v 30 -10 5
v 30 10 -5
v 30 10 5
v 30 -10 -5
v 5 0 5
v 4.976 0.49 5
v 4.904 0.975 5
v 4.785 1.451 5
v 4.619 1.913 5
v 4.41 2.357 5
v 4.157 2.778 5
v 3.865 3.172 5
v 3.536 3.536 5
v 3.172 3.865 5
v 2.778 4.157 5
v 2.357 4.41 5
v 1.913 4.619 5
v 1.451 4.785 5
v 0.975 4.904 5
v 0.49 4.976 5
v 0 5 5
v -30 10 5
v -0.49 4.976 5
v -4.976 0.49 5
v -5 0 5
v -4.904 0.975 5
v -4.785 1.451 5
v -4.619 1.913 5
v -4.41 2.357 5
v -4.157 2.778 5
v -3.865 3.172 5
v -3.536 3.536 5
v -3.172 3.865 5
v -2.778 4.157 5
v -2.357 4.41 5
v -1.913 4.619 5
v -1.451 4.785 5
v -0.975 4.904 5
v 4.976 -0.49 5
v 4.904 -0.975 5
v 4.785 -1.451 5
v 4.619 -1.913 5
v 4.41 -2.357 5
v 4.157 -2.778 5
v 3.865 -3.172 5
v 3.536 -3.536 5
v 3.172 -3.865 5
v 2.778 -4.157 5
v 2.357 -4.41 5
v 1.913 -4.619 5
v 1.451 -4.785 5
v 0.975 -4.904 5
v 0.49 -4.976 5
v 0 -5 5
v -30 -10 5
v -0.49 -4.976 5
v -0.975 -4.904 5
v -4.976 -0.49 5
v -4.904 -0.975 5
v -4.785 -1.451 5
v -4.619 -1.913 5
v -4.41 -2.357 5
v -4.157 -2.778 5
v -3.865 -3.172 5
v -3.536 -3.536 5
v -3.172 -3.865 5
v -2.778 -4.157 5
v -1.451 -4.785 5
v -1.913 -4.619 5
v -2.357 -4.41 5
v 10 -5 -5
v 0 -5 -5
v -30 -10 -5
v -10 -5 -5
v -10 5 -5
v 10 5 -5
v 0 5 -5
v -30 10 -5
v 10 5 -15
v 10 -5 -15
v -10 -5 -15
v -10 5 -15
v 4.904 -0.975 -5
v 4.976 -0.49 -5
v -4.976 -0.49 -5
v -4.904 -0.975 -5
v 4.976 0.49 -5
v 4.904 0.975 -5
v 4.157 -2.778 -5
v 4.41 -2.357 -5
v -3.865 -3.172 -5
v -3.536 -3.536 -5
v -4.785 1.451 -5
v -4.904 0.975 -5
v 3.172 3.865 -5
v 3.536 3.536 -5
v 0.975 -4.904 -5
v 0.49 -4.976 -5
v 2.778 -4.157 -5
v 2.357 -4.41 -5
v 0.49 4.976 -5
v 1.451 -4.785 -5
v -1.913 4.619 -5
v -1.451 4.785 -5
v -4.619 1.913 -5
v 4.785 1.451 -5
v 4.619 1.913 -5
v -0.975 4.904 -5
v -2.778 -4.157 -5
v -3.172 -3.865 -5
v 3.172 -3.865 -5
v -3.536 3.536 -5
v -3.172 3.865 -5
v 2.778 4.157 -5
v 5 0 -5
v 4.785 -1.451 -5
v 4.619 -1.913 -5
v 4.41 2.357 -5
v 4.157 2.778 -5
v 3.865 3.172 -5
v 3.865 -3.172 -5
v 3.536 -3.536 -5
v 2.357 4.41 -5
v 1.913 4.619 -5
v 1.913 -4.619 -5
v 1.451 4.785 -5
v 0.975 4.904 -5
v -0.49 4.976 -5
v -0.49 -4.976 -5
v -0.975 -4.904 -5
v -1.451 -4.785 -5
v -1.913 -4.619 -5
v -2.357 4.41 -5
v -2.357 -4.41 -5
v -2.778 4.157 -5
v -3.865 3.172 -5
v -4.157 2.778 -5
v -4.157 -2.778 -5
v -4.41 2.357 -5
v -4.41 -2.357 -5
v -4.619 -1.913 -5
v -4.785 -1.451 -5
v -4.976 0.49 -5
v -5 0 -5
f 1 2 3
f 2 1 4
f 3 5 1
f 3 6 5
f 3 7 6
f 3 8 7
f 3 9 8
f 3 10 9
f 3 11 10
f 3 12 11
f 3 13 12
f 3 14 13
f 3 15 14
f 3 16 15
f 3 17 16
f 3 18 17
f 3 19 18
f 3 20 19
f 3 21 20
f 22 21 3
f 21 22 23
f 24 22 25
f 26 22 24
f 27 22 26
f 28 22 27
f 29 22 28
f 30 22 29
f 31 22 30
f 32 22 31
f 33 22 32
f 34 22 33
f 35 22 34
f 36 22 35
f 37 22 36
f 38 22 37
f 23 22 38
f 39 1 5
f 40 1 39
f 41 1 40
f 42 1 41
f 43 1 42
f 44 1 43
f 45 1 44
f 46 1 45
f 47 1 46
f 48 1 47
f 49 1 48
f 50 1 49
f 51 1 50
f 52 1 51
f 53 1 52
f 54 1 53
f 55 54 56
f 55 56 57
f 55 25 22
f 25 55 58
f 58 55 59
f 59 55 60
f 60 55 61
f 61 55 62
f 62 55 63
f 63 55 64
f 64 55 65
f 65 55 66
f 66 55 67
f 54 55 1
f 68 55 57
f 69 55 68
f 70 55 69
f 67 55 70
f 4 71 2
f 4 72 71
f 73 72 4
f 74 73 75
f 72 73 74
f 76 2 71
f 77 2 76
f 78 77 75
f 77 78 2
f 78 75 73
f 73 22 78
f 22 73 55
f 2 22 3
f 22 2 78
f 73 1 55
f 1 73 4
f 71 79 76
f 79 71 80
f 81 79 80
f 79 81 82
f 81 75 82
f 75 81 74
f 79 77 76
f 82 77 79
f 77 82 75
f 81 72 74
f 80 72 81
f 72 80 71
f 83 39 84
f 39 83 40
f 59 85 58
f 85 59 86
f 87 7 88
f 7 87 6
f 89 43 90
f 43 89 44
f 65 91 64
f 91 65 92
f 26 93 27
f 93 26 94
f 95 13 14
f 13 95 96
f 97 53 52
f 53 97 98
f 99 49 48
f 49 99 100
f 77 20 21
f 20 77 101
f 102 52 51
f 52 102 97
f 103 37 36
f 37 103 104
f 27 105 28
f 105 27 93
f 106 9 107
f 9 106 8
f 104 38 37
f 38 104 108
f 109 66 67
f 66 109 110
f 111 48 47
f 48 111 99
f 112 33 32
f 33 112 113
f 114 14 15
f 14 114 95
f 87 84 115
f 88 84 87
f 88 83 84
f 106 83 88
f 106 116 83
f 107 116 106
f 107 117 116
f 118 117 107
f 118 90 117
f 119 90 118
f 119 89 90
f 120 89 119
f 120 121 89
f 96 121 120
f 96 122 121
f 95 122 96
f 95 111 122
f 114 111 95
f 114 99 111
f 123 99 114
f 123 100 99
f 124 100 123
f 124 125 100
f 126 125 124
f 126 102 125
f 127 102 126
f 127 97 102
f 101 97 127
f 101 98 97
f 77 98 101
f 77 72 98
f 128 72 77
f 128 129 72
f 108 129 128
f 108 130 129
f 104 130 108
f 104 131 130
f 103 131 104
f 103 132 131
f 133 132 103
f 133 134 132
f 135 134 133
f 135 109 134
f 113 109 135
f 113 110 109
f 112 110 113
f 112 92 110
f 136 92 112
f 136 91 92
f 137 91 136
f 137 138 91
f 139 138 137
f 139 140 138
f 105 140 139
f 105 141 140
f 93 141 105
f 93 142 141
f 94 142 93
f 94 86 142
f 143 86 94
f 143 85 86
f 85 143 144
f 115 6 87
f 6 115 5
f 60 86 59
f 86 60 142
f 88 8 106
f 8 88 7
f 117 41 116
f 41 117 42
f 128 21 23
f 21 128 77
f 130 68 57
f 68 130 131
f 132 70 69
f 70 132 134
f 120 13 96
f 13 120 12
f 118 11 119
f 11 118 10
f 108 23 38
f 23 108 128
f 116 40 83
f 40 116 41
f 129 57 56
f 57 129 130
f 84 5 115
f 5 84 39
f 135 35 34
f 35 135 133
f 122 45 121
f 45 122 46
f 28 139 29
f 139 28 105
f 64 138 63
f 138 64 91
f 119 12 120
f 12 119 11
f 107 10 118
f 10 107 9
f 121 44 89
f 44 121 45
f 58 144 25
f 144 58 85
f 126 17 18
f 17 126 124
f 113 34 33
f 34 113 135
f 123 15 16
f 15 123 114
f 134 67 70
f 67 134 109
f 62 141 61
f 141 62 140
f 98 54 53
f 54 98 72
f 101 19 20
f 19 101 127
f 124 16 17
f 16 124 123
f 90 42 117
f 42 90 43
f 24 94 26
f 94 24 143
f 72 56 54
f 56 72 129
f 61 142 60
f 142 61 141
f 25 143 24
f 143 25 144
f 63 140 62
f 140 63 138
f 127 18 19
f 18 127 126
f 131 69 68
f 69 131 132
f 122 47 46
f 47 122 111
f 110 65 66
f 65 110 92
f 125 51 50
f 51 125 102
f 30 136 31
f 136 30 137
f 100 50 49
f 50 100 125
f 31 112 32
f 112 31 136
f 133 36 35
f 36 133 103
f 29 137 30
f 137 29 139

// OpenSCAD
module t_shaped_bracket() {
    difference() {
        union() {
            // Main body
            translate([-30, -10, -5])
                cube([60, 20, 10]);
            // Stem
            translate([-10, -5, -15])
                cube([20, 10, 10]);
        }
        // Circular through-hole
        translate([0, 0, -5])
            cylinder(h=10, r=5, $fn=64);
    }
}

t_shaped_bracket();
